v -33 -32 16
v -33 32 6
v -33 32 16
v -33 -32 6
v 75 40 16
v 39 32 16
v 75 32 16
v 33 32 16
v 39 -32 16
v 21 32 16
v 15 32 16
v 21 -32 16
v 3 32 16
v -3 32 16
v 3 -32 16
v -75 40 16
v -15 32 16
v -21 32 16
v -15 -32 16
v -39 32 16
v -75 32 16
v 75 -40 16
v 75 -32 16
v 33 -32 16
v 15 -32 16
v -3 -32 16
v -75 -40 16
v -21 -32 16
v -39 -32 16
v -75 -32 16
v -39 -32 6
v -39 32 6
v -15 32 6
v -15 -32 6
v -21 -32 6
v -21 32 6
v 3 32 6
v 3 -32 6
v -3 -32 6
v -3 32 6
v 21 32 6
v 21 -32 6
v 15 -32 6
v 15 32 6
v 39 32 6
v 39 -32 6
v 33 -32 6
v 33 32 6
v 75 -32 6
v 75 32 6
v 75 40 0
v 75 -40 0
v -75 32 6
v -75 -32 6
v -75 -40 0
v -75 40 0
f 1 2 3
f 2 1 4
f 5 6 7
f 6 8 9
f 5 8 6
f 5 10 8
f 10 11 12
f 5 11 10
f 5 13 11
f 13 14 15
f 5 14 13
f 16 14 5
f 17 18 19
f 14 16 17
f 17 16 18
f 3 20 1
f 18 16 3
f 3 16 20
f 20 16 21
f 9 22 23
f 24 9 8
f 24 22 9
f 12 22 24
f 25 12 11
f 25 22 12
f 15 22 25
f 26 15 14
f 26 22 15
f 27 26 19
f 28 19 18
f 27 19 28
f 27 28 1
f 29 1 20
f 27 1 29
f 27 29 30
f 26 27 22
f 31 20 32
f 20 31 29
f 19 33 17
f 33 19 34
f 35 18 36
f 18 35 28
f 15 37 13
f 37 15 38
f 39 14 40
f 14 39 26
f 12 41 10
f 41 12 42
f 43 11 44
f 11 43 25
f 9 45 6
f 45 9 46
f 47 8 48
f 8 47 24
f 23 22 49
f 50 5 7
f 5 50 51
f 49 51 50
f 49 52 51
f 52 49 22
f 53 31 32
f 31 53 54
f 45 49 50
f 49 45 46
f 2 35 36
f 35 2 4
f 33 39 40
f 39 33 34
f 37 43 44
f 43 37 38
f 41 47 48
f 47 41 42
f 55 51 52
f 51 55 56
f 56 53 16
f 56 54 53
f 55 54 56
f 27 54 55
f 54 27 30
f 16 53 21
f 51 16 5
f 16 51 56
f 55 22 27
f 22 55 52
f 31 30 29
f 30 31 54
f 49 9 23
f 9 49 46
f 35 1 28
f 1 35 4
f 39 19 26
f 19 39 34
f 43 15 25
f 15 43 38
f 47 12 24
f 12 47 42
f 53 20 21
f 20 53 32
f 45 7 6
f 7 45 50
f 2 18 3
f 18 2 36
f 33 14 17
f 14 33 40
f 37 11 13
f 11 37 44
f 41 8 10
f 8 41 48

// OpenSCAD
$fn = 32;

// ----------------------------------------------------------------------
// Rib frame 150 x 80 x 16
// 5 ribs at 18 mm pitch
// ----------------------------------------------------------------------

// --- parameters (mm) ---
frame = [150, 80, 6];  // base plate size (x, y, z)
rail_w = 8;            // side rail width
ribs = 5;              // number of ribs
rib_t = 6;             // rib thickness
rib_h = 10;            // rib height above the base plate
pitch = 18;            // pitch between rib centres

// --- derived feature positions (mm) ---
span = (ribs - 1) * pitch;          // = 72   distance between the outer ribs
origin_x = -span / 2;               // = -36   X of the first rib
rib_len = frame[1] - 2 * rail_w + 2;  // = 66   rib length, 1 mm into each rail
feature_centers = [
  [origin_x + 0 * pitch, 0],
  [origin_x + 1 * pitch, 0],
  [origin_x + 2 * pitch, 0],
  [origin_x + 3 * pitch, 0],
  [origin_x + 4 * pitch, 0]
];   // rib centre line, drives the rib loop

// base plate, two side rails, then the ribs read straight off feature_centers
union() {
  translate([-frame[0] / 2, -frame[1] / 2, 0]) cube(frame);
  translate([-frame[0] / 2, -frame[1] / 2, 0]) cube([frame[0], rail_w, frame[2] + rib_h]);
  translate([-frame[0] / 2, frame[1] / 2 - rail_w, 0]) cube([frame[0], rail_w, frame[2] + rib_h]);
  for (centre = feature_centers)
    translate([centre[0] - rib_t / 2, centre[1] - rib_len / 2, frame[2] - 1])
      cube([rib_t, rib_len, rib_h + 1]);
}
